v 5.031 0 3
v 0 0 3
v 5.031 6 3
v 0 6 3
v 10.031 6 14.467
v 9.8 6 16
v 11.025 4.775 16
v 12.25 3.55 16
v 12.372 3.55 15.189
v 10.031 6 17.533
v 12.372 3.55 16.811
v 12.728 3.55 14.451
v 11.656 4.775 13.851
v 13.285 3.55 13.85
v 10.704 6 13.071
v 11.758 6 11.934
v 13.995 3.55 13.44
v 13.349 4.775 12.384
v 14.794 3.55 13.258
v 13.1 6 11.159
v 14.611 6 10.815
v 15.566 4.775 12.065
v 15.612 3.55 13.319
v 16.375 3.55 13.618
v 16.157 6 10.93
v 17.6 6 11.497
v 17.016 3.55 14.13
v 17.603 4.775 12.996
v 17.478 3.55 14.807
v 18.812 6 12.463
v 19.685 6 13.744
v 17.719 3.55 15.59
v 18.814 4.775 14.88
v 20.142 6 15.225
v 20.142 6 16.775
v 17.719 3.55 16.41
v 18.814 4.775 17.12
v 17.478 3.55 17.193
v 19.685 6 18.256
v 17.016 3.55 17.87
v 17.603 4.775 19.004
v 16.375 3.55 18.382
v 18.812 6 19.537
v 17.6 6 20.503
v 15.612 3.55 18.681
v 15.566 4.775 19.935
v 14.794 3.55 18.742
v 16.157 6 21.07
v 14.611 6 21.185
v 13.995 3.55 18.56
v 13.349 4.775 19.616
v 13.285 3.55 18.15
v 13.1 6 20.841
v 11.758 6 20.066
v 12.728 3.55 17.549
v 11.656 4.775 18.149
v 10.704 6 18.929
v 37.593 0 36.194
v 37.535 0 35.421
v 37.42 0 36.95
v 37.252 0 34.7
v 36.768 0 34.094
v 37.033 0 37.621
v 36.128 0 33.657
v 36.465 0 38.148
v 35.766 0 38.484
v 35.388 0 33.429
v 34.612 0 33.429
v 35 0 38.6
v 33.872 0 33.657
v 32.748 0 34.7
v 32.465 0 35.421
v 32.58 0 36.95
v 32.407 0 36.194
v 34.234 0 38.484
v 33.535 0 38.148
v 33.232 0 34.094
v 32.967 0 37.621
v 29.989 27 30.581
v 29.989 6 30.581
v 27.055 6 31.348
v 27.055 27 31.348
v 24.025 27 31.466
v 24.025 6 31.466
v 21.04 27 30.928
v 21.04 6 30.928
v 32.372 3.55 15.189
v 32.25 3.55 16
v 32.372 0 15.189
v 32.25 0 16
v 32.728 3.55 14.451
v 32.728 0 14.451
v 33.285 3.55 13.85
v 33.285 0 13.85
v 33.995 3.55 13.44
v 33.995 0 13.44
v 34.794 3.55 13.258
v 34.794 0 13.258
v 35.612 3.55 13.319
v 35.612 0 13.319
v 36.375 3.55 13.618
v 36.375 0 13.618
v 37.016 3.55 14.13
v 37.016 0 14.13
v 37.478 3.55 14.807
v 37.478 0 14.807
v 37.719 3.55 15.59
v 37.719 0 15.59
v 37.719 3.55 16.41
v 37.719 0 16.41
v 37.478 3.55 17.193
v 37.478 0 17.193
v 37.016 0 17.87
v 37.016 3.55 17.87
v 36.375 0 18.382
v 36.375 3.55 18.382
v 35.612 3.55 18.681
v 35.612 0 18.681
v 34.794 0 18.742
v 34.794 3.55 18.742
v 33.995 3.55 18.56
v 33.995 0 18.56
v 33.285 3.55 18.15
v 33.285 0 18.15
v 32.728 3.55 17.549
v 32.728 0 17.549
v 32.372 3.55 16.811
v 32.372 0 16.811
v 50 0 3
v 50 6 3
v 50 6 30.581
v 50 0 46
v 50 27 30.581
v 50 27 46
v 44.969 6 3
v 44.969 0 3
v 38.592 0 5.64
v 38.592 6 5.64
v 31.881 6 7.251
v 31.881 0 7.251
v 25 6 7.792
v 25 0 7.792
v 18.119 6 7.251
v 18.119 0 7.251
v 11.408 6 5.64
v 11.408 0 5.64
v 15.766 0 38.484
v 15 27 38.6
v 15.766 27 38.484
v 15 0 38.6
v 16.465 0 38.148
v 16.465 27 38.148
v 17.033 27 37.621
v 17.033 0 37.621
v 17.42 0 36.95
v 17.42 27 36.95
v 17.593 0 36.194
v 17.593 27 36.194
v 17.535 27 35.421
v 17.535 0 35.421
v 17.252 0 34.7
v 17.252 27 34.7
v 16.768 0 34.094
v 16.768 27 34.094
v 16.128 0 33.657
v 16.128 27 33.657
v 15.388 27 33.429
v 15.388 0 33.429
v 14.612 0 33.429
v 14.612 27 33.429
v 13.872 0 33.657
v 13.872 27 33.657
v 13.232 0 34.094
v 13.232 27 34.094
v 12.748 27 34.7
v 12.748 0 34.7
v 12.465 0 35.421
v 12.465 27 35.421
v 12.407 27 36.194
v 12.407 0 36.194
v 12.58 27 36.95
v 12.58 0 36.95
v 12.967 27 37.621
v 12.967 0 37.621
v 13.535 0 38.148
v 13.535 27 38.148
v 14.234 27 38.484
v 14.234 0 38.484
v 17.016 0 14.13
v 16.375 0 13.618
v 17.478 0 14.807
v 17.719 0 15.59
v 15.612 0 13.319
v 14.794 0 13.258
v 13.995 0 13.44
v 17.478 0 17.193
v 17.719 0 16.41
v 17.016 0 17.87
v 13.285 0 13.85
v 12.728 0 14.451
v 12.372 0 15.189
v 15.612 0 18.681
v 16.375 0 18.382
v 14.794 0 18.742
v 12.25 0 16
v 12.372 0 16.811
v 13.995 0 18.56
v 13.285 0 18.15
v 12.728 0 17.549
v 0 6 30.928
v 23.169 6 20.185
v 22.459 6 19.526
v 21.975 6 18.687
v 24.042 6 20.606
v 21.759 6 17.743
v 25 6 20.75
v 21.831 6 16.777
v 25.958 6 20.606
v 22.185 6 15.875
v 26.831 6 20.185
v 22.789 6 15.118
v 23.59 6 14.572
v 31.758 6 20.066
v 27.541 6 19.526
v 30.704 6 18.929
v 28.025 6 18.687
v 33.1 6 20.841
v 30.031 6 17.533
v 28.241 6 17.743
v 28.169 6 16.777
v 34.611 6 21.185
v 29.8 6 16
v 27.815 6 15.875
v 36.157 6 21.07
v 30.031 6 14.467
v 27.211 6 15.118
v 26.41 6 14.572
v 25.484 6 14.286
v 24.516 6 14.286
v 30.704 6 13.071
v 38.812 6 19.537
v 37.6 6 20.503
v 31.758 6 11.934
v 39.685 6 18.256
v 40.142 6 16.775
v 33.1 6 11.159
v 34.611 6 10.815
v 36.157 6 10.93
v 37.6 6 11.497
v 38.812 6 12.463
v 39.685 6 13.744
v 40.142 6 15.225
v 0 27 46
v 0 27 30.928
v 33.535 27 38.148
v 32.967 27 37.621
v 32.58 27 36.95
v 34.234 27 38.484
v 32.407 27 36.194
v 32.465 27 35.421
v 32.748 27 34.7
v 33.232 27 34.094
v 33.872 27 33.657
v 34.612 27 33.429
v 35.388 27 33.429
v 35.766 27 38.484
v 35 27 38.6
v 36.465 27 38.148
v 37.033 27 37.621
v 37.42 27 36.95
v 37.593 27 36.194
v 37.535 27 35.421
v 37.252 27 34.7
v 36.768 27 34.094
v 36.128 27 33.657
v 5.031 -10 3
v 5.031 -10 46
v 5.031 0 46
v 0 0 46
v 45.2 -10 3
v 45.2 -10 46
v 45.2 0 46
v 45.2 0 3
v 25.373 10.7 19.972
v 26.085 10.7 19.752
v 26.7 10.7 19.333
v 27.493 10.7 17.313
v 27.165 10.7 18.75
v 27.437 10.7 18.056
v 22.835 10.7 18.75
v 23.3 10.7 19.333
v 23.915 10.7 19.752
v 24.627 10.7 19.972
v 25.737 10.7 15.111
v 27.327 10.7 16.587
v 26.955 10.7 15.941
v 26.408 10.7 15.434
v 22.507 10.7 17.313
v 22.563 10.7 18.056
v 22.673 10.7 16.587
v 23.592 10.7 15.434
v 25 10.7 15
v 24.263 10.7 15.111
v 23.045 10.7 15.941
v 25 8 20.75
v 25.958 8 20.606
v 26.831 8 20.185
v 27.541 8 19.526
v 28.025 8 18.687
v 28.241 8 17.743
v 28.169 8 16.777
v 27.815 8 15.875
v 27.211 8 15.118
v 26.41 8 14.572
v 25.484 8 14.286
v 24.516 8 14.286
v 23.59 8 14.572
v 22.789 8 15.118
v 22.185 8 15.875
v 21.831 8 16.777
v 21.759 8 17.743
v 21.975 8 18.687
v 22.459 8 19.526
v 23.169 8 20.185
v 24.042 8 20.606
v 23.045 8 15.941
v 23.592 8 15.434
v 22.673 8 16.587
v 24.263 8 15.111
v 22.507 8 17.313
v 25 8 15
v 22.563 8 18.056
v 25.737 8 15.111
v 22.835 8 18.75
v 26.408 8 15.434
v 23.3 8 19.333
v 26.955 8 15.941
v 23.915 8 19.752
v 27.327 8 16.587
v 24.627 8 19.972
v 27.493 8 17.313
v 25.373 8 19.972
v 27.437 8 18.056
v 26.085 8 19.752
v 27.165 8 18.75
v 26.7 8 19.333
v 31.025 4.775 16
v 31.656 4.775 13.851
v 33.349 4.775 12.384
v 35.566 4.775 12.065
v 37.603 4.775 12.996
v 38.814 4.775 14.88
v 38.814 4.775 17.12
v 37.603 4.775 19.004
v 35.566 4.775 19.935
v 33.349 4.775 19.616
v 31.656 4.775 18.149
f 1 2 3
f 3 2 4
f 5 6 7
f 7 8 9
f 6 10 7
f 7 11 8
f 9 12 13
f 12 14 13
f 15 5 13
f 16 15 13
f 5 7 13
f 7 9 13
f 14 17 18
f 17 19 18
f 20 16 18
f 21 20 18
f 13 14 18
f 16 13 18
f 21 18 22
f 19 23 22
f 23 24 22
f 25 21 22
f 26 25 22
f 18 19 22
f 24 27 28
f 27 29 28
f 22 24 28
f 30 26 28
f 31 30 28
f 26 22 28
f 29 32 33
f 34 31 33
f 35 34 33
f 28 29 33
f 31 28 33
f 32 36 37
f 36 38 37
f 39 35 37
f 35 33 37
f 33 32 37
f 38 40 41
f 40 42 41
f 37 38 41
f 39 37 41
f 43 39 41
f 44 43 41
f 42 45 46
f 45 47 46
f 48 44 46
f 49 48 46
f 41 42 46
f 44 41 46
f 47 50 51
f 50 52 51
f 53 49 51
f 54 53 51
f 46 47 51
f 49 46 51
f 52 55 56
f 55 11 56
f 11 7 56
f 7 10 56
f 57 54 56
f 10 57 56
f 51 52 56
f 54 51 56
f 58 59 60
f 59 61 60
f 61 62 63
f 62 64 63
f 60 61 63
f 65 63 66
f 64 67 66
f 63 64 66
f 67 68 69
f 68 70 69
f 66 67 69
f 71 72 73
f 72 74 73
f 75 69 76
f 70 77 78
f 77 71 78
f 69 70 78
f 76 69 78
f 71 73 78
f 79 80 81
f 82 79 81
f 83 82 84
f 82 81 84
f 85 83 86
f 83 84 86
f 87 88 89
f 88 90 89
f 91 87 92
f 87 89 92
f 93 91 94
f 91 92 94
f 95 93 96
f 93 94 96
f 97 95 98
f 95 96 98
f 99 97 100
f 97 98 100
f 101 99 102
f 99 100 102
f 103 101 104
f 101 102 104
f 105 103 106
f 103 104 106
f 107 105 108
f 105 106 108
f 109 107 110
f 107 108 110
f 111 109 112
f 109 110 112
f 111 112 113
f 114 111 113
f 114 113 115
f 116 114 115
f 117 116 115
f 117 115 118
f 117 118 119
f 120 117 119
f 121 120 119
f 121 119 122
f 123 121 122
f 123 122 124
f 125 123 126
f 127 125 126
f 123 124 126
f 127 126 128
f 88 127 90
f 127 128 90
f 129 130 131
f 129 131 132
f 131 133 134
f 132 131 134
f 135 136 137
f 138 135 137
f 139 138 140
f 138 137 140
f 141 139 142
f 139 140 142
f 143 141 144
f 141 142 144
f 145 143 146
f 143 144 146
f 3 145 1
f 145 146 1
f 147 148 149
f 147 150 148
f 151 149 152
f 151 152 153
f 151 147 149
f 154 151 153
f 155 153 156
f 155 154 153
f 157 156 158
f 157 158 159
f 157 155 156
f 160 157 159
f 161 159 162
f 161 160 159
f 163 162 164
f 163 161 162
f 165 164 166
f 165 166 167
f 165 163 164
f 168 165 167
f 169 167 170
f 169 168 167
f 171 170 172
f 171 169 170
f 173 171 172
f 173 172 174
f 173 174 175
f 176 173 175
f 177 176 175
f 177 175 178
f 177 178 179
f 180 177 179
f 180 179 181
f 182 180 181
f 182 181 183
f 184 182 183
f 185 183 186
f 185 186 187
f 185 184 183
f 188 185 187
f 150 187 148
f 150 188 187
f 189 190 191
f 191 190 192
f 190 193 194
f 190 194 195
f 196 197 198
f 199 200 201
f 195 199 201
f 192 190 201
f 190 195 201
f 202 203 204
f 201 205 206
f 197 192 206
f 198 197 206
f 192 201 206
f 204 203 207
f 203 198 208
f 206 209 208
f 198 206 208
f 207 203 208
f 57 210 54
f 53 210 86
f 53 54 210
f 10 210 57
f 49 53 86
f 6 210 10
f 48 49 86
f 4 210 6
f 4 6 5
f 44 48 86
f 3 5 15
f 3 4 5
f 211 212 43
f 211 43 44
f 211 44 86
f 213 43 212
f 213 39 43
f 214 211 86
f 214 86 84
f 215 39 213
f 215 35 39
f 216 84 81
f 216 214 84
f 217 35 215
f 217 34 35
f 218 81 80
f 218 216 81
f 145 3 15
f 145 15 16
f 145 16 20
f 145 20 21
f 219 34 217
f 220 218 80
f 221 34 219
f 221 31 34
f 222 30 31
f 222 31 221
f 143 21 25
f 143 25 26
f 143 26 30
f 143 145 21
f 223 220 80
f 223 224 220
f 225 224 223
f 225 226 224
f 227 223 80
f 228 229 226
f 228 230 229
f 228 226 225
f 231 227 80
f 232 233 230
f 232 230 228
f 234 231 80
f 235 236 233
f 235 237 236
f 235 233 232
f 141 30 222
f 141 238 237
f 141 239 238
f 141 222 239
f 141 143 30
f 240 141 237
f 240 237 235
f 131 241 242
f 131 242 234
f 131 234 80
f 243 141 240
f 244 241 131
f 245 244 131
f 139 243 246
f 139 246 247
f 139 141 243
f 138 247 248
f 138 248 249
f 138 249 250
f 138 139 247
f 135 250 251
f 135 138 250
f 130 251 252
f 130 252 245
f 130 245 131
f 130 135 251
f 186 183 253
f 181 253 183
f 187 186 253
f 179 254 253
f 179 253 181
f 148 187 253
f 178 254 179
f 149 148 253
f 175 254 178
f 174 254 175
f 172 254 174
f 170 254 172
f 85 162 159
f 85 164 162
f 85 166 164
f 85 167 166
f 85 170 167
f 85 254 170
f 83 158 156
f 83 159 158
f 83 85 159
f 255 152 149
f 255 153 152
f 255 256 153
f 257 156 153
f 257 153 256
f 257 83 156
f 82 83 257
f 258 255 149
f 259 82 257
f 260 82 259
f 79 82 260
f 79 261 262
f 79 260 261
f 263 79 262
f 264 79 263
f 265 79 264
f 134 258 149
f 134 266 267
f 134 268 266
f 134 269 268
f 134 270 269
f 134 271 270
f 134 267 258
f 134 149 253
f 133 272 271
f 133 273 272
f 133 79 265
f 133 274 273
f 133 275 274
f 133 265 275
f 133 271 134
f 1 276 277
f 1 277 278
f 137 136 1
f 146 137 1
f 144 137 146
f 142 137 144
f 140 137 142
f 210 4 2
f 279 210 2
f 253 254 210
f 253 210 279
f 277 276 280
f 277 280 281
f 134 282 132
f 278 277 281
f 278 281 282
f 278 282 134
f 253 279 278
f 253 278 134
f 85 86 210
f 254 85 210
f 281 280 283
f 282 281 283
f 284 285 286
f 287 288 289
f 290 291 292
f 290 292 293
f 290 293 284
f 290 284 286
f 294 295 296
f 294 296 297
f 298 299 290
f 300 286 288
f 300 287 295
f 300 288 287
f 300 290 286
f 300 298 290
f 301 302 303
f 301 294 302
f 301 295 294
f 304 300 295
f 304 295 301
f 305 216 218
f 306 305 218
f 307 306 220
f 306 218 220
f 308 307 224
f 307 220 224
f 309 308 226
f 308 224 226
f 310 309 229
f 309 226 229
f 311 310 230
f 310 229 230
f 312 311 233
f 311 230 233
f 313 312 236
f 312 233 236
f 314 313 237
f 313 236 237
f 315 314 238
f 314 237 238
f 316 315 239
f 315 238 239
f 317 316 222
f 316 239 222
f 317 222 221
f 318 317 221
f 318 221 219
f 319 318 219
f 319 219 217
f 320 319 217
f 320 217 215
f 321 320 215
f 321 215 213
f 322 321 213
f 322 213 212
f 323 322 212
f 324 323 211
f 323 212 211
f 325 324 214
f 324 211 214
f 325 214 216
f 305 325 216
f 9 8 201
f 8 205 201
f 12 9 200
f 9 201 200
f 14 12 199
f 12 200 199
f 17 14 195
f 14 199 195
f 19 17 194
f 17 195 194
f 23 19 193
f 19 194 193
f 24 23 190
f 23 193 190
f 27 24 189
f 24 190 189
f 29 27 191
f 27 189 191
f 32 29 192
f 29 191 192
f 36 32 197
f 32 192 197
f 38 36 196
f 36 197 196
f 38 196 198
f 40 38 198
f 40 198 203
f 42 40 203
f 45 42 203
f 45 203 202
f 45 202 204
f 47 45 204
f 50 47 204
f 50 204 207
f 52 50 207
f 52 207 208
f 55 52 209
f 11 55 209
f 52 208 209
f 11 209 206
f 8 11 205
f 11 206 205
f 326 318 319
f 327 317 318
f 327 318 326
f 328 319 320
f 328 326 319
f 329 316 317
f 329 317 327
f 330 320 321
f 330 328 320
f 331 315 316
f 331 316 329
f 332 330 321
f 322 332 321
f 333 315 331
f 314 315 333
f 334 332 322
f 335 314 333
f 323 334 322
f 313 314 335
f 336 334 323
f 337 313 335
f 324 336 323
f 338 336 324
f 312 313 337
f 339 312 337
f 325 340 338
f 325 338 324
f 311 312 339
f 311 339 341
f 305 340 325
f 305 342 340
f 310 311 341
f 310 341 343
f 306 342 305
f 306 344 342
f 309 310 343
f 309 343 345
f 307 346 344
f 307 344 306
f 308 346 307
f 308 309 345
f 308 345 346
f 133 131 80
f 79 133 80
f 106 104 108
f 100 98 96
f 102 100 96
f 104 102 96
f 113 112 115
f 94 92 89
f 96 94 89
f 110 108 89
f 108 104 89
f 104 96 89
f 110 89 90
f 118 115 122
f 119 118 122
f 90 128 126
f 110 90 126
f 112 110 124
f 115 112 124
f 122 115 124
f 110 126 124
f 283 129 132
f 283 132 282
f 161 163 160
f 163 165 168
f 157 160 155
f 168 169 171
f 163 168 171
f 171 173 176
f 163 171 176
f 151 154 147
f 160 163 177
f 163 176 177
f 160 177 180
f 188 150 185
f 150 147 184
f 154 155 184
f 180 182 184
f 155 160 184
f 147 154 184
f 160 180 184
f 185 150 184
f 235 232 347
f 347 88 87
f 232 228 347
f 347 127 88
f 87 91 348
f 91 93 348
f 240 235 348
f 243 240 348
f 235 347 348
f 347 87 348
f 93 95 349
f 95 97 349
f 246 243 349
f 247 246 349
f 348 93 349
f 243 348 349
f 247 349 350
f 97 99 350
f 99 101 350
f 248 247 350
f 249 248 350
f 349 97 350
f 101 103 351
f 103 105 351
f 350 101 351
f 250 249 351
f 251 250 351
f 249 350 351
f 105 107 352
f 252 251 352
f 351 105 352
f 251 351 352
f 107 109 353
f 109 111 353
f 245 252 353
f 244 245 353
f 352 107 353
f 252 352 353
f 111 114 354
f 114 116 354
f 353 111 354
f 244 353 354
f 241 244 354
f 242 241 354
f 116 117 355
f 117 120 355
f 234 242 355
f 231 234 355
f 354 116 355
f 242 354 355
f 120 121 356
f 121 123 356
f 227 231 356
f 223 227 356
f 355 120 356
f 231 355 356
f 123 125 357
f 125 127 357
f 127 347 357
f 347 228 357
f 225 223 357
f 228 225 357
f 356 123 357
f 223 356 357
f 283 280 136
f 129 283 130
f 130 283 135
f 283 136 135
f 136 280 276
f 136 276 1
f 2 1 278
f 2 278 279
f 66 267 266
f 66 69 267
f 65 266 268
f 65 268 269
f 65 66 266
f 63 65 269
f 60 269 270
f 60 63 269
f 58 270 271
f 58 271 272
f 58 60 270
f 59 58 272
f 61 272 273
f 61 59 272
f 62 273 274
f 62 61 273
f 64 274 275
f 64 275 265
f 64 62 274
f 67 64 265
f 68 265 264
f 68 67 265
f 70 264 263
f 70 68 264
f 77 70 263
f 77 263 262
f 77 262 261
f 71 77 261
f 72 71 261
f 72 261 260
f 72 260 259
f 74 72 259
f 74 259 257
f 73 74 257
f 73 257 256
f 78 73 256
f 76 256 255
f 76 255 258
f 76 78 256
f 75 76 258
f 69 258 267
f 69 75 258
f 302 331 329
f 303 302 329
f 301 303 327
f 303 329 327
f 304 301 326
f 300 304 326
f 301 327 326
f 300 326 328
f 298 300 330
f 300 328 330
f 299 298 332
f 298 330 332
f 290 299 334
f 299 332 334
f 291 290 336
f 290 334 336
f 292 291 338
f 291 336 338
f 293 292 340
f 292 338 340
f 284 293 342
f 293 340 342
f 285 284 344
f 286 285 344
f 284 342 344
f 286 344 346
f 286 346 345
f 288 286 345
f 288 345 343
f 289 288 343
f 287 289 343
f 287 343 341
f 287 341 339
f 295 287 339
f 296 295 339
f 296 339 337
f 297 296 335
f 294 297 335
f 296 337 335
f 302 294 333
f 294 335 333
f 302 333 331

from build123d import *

# Parameters (mm, degrees)
SKETCH1_R                                       = 2.6
BOSS_EXTRUDE1_DEPTH                             = 6
SKETCH2_R                                       = 3.25
BOSS_EXTRUDE2_DEPTH                             = 2
SKETCH3_R                                       = 2.5
BOSS_EXTRUDE3_DEPTH                             = 2.7
CSK_FOR_M5_FLAT_HEAD_MACHINE_SCREW1_D           = 5.5
CSK_FOR_M5_FLAT_HEAD_MACHINE_SCREW1_CSINK_D     = 10.4
CSK_FOR_M5_FLAT_HEAD_MACHINE_SCREW1_CSINK_ANGLE = 90
SKETCH7_R                                       = 2.6
BOSS_EXTRUDE5_DEPTH                             = 21
SKETCH8_W                                       = 43
SKETCH8_H                                       = 10
BOSS_EXTRUDE6_DEPTH                             = 50
SKETCH9_W                                       = 4.8
SKETCH9_H                                       = 10
SKETCH9_W_2                                     = 5.031184409
CUT_EXTRUDE1_DEPTH                              = 50


with BuildPart() as part:
    # Sketch1 → Boss-Extrude1 (new body)
    with BuildSketch(Plane(origin=(0, 0, 0), x_dir=(1, 0, 0), z_dir=(0, 1, 0))):
        with BuildLine():
            Line((5.031184409, -3), (0, -3))
            Line((0, -3), (0, -46))
            Line((0, -46), (50, -46))
            Line((50, -46), (50, -3))
            Line((50, -3), (44.968815591, -3))
            ThreePointArc((44.968815591, -3), (25, -7.79226602), (5.031184409, -3))
        make_face()
        with Locations(Location((15, -36, 0), (0, 0, 270))):
            Circle(SKETCH1_R, mode=Mode.SUBTRACT)
        with Locations(Location((35, -36, 0), (0, 0, 270))):
            Circle(SKETCH1_R, mode=Mode.SUBTRACT)
        with Locations(Location((15, -16, 0), (0, 0, 270))):
            Circle(SKETCH1_R, mode=Mode.SUBTRACT)
        with Locations(Location((35, -16, 0), (0, 0, 270))):
            Circle(SKETCH1_R, mode=Mode.SUBTRACT)
    extrude(amount=BOSS_EXTRUDE1_DEPTH)

    # Sketch2 → Boss-Extrude2 (add)
    with BuildSketch(Plane(origin=(0, 6, 0), x_dir=(1, 0, 0), z_dir=(0, 1, 0))):
        with Locations(Location((25, -17.5, 0), (0, 0, 270))):
            Circle(SKETCH2_R)
    extrude(amount=BOSS_EXTRUDE2_DEPTH)

    # Sketch3 → Boss-Extrude3 (add)
    with BuildSketch(Plane(origin=(0, 8, 0), x_dir=(1, 0, 0), z_dir=(0, 1, 0))):
        with Locations(Location((25, -17.5, 0), (0, 0, 90))):
            Circle(SKETCH3_R)
    extrude(amount=BOSS_EXTRUDE3_DEPTH)

    # CSK for M5 Flat Head Machine Screw1 (through all)
    with Locations(Plane(origin=(0, 6, 0), x_dir=(1, 0, 0), z_dir=(0, 1, 0))):
        with Locations((15, -16), (35, -16)):
            CounterSinkHole(CSK_FOR_M5_FLAT_HEAD_MACHINE_SCREW1_D / 2, CSK_FOR_M5_FLAT_HEAD_MACHINE_SCREW1_CSINK_D / 2, counter_sink_angle=CSK_FOR_M5_FLAT_HEAD_MACHINE_SCREW1_CSINK_ANGLE)

    # Sketch7 → Boss-Extrude5 (add)
    with BuildSketch(Plane(origin=(0, 6, 0), x_dir=(1, 0, 0), z_dir=(0, 1, 0))):
        with BuildLine():
            Line((21.039948447, -30.928253487), (0, -30.928253487))
            Line((0, -30.928253487), (0, -46))
            Line((0, -46), (50, -46))
            Line((50, -46), (50, -30.580877922))
            Line((50, -30.580877922), (29.989051292, -30.580877922))
            ThreePointArc((29.989051292, -30.580877922), (25.543026299, -31.489464694), (21.039948447, -30.928253487))
        make_face()
        with Locations(Location((15, -36, 0), (0, 0, 270))):
            Circle(SKETCH7_R, mode=Mode.SUBTRACT)
        with Locations(Location((35, -36, 0), (0, 0, 270))):
            Circle(SKETCH7_R, mode=Mode.SUBTRACT)
    extrude(amount=BOSS_EXTRUDE5_DEPTH)

    # Sketch8 → Boss-Extrude6 (add)
    with BuildSketch(Plane.ZY):
        with Locations((24.5, -5)):
            Rectangle(SKETCH8_W, SKETCH8_H)
    extrude(amount=-BOSS_EXTRUDE6_DEPTH)

    # Sketch9 → Cut-Extrude1 (cut)
    with BuildSketch(Plane(origin=(0, 0, 3), x_dir=(-1, 0, 0), z_dir=(0, 0, -1))):
        with Locations((-47.6, -5)):
            Rectangle(SKETCH9_W, SKETCH9_H)
        with Locations((-2.515592205, -5)):
            Rectangle(SKETCH9_W_2, SKETCH9_H)
    extrude(amount=-CUT_EXTRUDE1_DEPTH, mode=Mode.SUBTRACT)


solid = part.part
